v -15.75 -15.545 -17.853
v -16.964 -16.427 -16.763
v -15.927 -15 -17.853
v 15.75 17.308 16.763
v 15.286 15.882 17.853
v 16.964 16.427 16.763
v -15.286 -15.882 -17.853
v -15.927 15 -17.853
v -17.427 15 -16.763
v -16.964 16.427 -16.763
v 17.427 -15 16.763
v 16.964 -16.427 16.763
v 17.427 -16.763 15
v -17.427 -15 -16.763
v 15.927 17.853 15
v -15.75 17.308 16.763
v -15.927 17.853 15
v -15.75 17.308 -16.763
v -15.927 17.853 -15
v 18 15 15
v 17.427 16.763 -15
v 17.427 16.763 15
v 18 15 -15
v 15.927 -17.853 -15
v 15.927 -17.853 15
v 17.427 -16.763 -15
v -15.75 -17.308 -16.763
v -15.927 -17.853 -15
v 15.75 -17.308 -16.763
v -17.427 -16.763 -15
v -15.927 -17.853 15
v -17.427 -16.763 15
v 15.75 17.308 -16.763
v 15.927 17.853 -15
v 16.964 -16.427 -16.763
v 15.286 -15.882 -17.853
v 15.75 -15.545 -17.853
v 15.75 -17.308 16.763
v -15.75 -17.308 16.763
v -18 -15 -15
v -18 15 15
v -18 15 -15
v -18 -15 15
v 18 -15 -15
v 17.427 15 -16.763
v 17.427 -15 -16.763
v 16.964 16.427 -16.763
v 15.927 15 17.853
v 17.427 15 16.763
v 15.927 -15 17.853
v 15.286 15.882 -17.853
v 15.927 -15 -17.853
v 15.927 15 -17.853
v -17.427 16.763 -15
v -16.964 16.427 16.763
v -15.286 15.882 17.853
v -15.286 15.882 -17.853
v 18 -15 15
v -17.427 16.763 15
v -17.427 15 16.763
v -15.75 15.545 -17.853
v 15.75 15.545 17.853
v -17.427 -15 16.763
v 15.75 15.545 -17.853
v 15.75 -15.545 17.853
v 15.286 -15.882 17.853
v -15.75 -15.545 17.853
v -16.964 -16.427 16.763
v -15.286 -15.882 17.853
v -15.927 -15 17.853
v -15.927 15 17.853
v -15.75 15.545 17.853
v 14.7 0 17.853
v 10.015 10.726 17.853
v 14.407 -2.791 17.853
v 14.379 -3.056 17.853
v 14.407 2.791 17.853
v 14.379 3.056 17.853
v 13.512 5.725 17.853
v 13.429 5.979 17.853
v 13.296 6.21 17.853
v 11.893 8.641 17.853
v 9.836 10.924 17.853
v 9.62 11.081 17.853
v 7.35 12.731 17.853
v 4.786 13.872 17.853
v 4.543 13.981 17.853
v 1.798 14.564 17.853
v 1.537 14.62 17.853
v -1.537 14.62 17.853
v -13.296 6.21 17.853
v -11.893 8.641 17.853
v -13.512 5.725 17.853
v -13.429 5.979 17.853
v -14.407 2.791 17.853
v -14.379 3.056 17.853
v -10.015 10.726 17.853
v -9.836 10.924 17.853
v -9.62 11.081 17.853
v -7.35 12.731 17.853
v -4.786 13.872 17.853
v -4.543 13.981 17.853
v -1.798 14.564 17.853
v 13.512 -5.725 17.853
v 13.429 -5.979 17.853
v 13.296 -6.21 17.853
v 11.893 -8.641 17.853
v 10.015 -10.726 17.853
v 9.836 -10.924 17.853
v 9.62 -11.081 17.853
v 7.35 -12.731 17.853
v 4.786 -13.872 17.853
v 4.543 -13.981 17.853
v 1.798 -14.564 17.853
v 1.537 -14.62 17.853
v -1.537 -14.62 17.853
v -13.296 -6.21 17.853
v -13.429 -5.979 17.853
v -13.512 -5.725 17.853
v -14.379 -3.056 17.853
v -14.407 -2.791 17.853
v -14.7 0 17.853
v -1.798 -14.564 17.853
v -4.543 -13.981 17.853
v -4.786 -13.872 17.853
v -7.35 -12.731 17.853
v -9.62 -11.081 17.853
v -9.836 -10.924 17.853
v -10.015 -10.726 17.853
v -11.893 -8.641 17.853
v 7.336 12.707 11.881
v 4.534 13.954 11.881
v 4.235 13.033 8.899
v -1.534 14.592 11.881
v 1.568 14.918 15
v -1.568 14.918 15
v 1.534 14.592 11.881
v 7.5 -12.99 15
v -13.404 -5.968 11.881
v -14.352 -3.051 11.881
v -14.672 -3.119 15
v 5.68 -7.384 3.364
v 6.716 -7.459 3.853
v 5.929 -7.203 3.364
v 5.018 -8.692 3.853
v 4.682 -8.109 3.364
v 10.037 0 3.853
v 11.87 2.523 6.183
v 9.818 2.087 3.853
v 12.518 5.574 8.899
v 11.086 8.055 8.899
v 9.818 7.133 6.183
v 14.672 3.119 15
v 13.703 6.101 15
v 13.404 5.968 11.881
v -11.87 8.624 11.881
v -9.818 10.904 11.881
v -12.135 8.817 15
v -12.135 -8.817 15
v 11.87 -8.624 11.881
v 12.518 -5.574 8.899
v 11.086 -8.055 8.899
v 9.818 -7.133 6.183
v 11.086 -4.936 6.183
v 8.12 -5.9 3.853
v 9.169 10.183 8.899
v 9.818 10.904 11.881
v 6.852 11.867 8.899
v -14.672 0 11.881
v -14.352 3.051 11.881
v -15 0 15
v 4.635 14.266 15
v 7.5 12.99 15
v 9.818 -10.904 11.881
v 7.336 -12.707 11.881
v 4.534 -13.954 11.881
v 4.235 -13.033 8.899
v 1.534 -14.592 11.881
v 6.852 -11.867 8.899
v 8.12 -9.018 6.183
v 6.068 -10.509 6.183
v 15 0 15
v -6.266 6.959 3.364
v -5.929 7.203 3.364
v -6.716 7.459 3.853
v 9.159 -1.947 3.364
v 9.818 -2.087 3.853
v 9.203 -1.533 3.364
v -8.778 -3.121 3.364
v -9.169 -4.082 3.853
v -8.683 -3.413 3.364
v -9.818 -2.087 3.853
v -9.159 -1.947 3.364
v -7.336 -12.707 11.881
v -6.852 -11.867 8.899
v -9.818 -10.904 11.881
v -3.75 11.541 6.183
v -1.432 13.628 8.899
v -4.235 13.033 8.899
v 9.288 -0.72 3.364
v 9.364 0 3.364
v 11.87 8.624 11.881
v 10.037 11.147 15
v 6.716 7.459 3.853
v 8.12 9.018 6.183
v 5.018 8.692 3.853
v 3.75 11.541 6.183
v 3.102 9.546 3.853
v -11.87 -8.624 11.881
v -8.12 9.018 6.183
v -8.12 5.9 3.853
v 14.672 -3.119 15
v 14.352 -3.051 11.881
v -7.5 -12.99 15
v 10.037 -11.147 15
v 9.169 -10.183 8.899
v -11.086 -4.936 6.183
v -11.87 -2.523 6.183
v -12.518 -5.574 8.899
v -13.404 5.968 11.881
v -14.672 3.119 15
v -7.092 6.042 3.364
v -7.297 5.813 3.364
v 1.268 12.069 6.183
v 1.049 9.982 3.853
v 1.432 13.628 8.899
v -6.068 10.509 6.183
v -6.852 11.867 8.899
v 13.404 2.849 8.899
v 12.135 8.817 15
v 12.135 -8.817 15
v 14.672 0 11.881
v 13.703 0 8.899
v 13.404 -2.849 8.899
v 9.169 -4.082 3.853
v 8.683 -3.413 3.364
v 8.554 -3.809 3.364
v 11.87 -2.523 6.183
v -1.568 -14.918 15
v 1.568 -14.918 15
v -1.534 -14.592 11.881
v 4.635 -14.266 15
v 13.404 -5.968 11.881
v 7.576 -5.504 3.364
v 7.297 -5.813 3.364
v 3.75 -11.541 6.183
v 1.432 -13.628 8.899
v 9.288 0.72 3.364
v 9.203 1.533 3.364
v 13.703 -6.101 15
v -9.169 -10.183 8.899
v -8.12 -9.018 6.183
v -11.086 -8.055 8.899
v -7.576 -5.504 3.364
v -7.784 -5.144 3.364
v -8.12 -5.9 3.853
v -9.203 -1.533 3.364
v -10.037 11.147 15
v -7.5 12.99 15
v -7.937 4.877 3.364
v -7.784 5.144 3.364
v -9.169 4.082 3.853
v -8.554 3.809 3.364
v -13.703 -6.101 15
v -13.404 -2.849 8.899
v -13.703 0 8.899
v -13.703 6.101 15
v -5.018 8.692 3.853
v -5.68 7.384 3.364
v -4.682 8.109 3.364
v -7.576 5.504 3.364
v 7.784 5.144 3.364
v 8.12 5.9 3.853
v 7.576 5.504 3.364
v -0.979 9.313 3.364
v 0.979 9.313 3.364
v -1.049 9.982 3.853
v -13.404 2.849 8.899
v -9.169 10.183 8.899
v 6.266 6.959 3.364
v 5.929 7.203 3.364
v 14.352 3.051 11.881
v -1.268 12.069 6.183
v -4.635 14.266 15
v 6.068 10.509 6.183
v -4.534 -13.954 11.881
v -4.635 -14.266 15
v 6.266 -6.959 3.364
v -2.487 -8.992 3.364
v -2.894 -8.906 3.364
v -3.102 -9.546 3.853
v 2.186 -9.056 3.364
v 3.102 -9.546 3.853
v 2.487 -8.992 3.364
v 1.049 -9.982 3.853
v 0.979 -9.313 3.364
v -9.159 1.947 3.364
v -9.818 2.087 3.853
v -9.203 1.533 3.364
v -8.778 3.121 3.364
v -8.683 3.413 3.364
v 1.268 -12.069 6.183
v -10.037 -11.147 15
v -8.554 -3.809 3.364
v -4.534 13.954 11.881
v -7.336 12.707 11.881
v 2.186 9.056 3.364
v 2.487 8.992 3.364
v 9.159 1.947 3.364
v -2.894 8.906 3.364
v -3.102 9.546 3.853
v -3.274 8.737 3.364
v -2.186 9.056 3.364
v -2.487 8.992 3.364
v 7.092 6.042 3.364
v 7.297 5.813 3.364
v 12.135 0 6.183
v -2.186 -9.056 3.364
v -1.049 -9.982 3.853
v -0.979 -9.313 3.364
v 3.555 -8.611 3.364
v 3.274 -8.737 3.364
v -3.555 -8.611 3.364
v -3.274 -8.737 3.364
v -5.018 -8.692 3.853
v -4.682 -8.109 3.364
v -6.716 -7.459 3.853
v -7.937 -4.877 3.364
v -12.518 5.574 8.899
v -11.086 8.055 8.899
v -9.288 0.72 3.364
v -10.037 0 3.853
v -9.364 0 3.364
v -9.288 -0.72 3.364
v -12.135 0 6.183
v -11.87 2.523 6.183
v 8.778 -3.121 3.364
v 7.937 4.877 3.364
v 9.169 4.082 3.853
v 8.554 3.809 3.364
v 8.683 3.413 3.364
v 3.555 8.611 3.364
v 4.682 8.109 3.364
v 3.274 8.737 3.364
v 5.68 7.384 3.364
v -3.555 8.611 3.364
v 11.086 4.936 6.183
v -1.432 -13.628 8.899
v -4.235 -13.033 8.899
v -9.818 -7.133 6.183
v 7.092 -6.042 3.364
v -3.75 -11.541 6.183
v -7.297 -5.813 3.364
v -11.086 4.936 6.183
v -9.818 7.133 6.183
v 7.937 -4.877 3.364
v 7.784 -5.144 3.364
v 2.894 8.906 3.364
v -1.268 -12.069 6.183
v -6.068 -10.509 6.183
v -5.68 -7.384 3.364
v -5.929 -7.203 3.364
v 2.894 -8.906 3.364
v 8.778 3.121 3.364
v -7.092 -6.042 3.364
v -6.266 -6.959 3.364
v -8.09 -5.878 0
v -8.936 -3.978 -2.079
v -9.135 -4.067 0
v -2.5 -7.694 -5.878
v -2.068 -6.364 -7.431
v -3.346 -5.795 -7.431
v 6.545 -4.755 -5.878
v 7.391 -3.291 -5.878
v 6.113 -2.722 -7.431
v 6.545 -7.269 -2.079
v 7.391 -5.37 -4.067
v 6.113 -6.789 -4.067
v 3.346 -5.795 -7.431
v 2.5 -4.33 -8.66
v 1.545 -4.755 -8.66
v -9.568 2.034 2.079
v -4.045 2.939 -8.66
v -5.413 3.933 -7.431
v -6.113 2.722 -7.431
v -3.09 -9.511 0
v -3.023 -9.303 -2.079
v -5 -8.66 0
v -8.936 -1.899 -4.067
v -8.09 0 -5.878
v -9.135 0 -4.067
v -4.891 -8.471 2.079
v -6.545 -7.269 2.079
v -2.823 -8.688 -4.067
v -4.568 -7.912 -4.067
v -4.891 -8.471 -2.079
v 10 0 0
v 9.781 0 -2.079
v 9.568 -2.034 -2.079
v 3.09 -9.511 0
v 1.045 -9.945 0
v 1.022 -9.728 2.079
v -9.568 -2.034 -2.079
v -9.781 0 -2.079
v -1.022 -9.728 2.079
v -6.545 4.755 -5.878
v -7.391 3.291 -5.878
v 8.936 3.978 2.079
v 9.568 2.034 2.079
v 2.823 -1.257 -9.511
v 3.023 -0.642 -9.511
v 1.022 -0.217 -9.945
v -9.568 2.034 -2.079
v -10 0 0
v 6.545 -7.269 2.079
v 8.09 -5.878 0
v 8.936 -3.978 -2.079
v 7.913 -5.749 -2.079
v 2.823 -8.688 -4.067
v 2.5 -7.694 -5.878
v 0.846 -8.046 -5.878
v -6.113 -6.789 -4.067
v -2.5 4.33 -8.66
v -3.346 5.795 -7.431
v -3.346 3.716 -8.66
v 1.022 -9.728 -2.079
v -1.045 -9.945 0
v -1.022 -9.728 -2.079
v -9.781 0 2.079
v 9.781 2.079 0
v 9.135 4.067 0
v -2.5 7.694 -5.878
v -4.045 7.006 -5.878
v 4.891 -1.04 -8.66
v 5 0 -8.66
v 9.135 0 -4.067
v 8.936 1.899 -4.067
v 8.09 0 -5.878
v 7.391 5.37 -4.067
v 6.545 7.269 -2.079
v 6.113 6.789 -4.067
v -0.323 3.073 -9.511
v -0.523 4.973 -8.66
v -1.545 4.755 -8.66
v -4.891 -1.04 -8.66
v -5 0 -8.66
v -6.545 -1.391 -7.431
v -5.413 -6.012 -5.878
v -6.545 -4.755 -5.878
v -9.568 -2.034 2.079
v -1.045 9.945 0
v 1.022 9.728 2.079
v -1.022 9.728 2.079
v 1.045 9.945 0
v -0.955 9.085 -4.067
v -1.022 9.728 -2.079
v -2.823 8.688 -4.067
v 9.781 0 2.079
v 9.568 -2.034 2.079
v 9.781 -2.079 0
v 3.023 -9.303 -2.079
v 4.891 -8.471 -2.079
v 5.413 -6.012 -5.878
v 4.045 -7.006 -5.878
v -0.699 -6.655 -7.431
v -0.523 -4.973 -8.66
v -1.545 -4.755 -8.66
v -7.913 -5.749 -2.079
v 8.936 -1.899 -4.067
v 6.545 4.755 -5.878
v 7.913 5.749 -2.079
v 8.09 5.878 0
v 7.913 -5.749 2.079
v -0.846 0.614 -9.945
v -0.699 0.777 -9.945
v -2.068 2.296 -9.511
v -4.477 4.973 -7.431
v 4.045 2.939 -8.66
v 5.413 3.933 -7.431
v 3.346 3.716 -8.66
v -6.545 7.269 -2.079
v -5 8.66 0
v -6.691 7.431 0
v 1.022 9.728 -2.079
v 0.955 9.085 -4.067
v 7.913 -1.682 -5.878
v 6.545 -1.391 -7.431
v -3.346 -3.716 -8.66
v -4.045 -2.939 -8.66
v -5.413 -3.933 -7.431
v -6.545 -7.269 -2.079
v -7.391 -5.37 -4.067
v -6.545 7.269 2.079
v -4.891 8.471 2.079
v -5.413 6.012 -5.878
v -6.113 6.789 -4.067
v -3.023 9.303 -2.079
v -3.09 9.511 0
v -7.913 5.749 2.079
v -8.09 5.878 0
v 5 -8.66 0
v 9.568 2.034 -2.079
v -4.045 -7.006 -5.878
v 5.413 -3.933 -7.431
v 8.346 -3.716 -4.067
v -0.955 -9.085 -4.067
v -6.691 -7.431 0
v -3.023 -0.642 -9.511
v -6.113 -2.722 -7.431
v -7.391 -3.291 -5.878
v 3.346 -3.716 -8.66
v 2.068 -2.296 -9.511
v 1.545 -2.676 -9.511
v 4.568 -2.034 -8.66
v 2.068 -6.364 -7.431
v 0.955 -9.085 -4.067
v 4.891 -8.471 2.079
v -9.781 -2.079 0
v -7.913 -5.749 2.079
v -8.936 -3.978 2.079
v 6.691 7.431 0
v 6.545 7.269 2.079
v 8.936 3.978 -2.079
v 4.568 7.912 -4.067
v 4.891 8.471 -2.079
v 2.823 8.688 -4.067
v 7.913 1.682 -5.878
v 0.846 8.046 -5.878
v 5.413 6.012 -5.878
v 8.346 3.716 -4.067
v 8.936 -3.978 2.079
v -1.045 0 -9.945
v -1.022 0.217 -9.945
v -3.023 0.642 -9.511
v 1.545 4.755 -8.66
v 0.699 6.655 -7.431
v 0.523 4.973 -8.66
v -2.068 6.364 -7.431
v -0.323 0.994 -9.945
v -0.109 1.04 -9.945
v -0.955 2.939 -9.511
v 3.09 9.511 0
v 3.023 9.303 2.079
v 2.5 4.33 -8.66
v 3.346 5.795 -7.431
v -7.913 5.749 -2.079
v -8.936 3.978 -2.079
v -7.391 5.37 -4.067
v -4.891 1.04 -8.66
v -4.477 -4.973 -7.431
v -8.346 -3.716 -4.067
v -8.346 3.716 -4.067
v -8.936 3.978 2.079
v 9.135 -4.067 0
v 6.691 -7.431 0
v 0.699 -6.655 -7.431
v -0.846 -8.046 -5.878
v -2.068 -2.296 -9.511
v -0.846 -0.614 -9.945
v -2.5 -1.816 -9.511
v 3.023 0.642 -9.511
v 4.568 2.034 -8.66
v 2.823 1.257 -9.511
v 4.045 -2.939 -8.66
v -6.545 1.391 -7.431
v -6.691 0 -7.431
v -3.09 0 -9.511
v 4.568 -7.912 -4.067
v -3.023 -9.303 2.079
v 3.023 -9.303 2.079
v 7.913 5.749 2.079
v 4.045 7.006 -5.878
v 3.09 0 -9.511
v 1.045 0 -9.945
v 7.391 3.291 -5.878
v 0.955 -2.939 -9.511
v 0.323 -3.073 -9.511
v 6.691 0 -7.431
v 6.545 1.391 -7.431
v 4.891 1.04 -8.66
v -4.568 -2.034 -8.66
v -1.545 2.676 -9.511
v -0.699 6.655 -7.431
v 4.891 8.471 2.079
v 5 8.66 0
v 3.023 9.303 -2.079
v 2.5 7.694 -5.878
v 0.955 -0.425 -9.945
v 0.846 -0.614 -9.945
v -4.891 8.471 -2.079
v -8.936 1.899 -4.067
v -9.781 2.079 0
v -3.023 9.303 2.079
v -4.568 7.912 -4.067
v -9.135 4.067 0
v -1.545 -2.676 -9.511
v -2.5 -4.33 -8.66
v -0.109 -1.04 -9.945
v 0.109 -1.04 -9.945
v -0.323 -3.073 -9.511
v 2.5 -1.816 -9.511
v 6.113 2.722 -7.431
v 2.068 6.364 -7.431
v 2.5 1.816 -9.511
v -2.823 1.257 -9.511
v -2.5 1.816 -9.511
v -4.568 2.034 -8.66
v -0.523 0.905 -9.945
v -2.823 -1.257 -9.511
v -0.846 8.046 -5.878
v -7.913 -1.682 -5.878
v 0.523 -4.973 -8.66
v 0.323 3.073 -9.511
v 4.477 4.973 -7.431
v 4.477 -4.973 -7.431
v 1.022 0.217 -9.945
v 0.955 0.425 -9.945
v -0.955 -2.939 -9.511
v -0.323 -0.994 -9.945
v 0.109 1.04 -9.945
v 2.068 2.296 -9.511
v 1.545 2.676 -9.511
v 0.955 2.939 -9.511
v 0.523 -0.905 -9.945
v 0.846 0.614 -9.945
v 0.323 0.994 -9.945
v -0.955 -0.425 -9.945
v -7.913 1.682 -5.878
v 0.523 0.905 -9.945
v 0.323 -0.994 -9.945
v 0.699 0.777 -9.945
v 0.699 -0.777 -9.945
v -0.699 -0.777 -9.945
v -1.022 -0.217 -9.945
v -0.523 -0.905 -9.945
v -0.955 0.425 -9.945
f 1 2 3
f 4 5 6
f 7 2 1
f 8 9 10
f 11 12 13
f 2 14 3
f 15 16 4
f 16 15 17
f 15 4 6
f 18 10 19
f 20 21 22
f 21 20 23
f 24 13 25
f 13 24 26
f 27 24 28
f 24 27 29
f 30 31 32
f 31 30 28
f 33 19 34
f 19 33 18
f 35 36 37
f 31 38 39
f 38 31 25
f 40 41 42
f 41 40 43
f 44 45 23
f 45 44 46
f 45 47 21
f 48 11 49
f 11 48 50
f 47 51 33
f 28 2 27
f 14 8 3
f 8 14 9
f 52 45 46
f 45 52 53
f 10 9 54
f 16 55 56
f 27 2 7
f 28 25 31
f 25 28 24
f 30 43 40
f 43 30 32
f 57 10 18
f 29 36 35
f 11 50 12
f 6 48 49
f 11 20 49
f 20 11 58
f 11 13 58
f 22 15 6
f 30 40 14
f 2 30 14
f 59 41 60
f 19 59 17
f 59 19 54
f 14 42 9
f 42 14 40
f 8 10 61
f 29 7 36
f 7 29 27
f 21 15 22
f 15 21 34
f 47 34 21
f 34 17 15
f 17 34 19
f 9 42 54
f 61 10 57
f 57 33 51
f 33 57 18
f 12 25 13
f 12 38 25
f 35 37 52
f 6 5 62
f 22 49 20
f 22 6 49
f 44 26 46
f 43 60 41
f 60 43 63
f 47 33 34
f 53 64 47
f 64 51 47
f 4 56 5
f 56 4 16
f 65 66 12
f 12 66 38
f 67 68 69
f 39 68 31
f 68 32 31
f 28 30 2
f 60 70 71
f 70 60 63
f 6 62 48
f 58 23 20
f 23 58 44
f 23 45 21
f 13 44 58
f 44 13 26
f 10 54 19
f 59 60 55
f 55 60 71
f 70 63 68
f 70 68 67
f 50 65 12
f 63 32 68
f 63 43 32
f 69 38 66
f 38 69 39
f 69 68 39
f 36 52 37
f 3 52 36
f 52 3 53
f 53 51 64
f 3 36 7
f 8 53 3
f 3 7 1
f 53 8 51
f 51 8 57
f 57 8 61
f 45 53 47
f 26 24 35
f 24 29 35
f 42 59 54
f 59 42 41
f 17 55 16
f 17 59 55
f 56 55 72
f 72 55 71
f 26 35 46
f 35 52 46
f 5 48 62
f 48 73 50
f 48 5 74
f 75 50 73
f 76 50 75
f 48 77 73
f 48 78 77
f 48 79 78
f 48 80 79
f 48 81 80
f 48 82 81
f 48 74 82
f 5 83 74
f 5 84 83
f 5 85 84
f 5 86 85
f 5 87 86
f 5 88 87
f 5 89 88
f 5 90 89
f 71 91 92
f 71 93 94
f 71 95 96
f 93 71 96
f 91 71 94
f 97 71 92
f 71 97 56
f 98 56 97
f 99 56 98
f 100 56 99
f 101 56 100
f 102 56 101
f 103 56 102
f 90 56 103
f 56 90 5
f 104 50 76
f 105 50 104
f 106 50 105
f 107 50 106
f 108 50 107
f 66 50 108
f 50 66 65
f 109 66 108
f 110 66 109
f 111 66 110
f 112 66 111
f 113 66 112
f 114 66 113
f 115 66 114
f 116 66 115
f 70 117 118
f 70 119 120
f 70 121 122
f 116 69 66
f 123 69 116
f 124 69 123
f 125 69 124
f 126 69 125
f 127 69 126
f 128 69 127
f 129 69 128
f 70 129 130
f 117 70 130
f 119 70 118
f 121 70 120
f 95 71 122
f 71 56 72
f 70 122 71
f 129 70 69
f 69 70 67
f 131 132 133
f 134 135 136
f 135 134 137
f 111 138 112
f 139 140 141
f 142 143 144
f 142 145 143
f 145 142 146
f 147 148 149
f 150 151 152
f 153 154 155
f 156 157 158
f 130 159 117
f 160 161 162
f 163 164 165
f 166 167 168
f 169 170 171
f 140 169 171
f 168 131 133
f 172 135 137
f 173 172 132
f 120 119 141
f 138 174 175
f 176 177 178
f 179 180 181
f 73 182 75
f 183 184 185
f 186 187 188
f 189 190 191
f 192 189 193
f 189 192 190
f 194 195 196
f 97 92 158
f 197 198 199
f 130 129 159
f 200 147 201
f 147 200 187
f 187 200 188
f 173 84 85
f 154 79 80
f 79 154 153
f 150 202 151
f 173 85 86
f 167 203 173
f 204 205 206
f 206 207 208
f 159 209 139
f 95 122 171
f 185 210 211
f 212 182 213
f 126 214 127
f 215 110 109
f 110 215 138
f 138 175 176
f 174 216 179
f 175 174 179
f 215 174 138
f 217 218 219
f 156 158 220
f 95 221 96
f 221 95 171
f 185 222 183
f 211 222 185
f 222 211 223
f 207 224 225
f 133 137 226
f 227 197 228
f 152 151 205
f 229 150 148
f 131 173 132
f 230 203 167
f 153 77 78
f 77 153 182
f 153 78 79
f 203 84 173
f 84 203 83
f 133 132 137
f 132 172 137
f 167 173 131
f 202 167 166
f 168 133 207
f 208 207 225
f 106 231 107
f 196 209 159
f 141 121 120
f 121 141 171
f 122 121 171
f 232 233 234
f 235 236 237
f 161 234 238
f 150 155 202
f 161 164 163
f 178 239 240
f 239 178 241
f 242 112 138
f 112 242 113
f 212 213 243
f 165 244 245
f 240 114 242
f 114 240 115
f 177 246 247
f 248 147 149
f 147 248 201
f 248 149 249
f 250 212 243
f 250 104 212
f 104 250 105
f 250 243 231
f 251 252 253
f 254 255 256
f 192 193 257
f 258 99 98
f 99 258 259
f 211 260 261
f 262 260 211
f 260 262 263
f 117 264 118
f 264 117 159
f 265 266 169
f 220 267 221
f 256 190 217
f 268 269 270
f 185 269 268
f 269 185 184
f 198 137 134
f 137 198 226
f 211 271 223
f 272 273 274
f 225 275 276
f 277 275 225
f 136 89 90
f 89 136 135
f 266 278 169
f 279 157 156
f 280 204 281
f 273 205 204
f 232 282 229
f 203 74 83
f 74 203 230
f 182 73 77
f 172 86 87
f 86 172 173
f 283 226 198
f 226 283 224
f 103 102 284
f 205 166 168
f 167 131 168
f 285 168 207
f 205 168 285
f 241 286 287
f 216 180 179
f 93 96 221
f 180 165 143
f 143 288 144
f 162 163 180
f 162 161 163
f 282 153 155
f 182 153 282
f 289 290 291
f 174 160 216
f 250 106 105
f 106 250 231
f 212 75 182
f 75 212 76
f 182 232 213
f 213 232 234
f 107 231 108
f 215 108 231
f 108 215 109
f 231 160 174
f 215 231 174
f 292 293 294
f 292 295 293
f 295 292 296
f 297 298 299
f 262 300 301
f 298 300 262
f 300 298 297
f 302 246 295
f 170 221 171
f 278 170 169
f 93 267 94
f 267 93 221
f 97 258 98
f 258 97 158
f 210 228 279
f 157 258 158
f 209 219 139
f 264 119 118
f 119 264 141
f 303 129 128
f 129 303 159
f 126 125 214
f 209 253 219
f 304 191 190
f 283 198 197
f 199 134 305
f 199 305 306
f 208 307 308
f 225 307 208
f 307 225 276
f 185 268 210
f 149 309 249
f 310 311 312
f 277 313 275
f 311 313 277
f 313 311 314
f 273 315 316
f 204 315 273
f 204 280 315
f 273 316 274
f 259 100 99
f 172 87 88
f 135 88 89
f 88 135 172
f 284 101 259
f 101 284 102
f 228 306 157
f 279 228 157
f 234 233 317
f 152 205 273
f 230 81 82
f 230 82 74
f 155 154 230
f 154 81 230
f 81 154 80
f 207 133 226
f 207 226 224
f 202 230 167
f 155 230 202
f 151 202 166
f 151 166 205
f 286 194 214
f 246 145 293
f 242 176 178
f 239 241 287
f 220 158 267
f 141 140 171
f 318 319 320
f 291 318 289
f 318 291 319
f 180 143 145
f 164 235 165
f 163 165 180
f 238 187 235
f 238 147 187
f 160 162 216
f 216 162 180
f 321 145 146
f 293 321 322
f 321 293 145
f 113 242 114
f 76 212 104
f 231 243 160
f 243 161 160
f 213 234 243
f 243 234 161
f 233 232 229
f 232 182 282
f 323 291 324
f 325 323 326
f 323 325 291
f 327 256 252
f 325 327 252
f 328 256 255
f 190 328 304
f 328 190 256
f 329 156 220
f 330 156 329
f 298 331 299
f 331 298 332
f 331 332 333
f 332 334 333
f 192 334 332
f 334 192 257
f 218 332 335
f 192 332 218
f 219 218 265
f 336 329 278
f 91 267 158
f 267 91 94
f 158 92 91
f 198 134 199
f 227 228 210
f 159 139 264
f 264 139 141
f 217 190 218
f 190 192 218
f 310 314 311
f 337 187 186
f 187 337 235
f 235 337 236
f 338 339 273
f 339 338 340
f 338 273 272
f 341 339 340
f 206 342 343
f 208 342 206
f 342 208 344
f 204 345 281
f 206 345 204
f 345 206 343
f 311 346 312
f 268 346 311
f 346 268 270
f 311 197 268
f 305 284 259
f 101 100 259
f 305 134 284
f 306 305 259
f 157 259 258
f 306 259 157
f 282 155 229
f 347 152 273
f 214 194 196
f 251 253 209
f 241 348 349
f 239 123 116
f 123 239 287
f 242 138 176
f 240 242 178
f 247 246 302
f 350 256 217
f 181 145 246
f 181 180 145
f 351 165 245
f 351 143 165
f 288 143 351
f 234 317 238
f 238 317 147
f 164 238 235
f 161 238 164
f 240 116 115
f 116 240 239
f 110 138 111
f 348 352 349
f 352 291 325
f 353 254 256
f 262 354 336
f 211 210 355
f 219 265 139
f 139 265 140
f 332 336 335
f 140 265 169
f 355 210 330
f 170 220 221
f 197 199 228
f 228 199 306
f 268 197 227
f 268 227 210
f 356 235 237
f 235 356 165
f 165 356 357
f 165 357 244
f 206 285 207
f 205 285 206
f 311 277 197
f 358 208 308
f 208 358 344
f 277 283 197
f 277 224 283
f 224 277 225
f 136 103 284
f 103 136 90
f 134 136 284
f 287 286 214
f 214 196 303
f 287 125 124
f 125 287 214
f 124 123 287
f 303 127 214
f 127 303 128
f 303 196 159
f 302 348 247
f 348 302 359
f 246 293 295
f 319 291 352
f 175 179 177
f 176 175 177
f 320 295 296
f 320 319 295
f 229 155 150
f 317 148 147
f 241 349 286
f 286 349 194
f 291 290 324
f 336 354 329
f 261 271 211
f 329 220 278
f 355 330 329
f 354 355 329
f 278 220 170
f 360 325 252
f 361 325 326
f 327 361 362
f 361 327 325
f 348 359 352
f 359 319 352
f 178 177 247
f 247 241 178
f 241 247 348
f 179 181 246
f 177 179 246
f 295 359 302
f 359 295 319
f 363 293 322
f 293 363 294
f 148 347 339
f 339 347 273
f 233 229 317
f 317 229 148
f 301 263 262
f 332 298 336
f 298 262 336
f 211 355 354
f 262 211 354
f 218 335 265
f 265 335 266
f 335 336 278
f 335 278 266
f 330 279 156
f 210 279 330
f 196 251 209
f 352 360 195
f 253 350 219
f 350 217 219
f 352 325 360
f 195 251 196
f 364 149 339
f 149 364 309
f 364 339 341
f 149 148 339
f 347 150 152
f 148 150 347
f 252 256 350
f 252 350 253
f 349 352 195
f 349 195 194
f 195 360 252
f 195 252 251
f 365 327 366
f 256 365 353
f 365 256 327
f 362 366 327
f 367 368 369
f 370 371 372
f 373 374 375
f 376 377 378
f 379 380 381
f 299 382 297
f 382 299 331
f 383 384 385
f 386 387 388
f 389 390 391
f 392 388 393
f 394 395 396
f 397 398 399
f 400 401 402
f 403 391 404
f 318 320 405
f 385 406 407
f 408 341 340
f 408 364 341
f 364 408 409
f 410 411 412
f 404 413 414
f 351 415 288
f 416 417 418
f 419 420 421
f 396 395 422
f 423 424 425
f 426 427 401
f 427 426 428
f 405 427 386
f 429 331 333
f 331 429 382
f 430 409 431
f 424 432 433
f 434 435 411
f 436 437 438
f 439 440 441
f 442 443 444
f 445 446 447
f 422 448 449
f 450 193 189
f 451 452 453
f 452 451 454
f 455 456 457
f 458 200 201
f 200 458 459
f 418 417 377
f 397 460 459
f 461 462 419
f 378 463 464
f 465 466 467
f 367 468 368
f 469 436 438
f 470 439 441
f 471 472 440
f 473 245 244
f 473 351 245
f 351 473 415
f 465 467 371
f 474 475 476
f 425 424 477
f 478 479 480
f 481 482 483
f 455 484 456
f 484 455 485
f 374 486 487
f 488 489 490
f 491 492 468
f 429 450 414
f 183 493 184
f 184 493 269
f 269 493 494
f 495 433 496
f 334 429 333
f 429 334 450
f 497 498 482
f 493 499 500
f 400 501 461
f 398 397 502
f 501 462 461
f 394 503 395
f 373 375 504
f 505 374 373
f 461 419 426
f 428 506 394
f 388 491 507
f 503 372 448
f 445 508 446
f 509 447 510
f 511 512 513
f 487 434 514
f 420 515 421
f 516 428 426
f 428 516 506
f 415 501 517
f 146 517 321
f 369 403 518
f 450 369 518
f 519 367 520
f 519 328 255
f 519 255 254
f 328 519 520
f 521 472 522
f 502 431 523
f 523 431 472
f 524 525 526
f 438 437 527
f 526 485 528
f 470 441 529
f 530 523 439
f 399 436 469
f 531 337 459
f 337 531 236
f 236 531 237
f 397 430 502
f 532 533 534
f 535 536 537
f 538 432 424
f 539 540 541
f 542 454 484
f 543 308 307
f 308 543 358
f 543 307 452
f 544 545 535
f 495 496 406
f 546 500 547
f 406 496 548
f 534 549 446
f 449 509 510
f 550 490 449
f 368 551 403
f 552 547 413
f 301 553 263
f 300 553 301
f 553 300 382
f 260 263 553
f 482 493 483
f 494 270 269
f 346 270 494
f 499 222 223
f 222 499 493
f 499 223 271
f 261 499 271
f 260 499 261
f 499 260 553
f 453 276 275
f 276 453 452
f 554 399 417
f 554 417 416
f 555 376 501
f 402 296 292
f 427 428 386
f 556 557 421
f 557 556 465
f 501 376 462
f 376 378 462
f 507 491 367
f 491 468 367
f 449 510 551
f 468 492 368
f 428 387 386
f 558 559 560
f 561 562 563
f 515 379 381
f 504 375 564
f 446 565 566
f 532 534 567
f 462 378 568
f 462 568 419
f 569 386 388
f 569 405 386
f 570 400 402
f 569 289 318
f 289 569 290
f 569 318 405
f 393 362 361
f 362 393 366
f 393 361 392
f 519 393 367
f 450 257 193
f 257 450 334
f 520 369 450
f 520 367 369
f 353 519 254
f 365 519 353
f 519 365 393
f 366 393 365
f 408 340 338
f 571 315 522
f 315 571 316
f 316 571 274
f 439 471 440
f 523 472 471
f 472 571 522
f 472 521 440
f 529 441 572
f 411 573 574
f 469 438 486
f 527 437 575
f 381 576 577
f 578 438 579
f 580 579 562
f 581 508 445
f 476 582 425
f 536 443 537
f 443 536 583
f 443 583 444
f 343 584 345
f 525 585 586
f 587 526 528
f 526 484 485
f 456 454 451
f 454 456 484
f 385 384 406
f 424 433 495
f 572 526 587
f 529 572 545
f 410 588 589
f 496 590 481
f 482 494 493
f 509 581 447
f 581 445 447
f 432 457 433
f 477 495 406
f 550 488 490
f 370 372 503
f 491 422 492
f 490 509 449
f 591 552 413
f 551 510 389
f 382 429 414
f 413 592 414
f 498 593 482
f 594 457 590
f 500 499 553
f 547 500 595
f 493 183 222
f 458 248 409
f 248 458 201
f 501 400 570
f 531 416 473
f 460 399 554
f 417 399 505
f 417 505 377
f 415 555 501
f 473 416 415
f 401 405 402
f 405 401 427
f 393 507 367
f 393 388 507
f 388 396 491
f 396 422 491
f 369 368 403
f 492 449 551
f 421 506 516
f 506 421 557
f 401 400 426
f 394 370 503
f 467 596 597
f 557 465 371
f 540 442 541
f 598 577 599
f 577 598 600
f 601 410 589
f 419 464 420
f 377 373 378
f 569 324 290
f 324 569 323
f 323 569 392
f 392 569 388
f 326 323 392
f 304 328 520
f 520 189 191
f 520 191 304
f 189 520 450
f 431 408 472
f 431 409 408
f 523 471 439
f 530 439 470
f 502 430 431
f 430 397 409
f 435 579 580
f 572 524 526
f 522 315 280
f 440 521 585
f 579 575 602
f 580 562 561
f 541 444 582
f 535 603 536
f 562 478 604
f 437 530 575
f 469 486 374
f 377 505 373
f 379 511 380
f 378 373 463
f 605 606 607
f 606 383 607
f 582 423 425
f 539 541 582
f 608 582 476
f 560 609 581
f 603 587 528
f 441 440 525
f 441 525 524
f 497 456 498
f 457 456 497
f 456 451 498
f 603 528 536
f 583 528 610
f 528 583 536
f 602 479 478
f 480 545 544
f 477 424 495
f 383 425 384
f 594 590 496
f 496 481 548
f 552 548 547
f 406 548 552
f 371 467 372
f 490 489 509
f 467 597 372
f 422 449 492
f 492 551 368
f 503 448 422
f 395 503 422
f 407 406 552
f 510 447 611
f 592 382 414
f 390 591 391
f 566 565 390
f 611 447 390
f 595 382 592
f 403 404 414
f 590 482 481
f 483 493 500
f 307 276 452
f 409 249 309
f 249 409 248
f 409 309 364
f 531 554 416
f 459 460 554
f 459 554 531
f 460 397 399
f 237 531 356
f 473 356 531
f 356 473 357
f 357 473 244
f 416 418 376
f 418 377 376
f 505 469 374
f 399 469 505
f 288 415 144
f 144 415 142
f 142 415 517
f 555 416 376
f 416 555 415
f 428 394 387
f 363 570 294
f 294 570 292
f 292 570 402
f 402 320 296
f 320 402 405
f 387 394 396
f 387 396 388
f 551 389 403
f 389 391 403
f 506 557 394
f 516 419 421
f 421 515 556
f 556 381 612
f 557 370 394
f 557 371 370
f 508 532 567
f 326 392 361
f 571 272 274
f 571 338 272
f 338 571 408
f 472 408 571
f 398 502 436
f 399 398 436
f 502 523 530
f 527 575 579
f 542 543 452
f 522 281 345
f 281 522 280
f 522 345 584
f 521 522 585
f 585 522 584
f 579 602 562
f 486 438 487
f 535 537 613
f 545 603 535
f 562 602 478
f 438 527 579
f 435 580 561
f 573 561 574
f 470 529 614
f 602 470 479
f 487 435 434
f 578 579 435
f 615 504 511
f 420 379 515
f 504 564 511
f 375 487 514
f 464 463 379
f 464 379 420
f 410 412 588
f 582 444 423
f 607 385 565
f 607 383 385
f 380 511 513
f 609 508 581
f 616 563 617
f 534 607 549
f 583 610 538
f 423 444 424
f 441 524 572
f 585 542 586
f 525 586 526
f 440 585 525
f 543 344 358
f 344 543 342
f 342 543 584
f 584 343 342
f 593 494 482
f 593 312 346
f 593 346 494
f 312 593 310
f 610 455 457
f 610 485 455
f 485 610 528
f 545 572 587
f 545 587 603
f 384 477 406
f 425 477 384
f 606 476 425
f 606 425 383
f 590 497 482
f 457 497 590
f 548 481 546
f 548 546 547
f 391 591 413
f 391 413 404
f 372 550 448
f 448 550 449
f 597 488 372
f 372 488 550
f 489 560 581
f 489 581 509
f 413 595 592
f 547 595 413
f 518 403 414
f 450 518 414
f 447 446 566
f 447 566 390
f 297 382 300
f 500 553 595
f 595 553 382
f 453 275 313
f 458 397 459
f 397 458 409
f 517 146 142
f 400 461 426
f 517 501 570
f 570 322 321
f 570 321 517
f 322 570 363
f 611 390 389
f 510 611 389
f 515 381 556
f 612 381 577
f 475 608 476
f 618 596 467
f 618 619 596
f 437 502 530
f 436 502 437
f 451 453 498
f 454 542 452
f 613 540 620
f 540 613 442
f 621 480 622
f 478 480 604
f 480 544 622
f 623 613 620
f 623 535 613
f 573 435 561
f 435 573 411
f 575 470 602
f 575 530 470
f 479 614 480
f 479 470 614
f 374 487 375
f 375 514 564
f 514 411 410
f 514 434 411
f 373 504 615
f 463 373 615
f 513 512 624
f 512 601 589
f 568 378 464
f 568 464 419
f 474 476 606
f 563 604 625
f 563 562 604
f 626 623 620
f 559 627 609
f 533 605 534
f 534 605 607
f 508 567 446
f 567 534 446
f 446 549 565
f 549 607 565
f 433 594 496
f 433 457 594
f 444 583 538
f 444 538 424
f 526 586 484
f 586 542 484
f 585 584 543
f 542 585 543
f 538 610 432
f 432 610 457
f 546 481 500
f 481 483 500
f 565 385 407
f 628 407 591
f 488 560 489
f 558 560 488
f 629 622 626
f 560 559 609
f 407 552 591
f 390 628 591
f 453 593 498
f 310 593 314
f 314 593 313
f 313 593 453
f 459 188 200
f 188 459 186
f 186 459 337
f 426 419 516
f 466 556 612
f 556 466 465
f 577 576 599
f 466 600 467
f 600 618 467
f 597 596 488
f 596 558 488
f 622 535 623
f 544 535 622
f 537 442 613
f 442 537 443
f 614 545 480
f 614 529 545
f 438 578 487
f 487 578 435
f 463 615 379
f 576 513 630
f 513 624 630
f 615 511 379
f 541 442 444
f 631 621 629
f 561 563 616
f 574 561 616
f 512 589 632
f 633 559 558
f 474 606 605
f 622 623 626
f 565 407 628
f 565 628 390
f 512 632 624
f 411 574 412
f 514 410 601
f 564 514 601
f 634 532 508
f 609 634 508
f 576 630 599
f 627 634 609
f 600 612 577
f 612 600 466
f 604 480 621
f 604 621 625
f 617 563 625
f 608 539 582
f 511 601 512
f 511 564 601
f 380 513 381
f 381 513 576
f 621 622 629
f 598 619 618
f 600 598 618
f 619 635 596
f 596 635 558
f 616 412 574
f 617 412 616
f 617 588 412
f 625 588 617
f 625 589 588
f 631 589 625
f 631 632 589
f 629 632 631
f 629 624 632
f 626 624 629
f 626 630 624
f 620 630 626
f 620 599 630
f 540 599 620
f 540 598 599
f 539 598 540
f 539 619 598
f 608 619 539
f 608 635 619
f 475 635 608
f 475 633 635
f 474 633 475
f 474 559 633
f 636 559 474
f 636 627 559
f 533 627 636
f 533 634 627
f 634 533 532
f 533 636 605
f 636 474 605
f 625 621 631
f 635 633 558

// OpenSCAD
//$fa=2; $fs=1;

difference() {
    minkowski()
    {
        cube(30, center = true);
        sphere(3);
    }
        //cube(30, center = true);
    translate([0, 0, 15])
    sphere(15, center = true);
    sphere(10, center=true);
    
  
}
